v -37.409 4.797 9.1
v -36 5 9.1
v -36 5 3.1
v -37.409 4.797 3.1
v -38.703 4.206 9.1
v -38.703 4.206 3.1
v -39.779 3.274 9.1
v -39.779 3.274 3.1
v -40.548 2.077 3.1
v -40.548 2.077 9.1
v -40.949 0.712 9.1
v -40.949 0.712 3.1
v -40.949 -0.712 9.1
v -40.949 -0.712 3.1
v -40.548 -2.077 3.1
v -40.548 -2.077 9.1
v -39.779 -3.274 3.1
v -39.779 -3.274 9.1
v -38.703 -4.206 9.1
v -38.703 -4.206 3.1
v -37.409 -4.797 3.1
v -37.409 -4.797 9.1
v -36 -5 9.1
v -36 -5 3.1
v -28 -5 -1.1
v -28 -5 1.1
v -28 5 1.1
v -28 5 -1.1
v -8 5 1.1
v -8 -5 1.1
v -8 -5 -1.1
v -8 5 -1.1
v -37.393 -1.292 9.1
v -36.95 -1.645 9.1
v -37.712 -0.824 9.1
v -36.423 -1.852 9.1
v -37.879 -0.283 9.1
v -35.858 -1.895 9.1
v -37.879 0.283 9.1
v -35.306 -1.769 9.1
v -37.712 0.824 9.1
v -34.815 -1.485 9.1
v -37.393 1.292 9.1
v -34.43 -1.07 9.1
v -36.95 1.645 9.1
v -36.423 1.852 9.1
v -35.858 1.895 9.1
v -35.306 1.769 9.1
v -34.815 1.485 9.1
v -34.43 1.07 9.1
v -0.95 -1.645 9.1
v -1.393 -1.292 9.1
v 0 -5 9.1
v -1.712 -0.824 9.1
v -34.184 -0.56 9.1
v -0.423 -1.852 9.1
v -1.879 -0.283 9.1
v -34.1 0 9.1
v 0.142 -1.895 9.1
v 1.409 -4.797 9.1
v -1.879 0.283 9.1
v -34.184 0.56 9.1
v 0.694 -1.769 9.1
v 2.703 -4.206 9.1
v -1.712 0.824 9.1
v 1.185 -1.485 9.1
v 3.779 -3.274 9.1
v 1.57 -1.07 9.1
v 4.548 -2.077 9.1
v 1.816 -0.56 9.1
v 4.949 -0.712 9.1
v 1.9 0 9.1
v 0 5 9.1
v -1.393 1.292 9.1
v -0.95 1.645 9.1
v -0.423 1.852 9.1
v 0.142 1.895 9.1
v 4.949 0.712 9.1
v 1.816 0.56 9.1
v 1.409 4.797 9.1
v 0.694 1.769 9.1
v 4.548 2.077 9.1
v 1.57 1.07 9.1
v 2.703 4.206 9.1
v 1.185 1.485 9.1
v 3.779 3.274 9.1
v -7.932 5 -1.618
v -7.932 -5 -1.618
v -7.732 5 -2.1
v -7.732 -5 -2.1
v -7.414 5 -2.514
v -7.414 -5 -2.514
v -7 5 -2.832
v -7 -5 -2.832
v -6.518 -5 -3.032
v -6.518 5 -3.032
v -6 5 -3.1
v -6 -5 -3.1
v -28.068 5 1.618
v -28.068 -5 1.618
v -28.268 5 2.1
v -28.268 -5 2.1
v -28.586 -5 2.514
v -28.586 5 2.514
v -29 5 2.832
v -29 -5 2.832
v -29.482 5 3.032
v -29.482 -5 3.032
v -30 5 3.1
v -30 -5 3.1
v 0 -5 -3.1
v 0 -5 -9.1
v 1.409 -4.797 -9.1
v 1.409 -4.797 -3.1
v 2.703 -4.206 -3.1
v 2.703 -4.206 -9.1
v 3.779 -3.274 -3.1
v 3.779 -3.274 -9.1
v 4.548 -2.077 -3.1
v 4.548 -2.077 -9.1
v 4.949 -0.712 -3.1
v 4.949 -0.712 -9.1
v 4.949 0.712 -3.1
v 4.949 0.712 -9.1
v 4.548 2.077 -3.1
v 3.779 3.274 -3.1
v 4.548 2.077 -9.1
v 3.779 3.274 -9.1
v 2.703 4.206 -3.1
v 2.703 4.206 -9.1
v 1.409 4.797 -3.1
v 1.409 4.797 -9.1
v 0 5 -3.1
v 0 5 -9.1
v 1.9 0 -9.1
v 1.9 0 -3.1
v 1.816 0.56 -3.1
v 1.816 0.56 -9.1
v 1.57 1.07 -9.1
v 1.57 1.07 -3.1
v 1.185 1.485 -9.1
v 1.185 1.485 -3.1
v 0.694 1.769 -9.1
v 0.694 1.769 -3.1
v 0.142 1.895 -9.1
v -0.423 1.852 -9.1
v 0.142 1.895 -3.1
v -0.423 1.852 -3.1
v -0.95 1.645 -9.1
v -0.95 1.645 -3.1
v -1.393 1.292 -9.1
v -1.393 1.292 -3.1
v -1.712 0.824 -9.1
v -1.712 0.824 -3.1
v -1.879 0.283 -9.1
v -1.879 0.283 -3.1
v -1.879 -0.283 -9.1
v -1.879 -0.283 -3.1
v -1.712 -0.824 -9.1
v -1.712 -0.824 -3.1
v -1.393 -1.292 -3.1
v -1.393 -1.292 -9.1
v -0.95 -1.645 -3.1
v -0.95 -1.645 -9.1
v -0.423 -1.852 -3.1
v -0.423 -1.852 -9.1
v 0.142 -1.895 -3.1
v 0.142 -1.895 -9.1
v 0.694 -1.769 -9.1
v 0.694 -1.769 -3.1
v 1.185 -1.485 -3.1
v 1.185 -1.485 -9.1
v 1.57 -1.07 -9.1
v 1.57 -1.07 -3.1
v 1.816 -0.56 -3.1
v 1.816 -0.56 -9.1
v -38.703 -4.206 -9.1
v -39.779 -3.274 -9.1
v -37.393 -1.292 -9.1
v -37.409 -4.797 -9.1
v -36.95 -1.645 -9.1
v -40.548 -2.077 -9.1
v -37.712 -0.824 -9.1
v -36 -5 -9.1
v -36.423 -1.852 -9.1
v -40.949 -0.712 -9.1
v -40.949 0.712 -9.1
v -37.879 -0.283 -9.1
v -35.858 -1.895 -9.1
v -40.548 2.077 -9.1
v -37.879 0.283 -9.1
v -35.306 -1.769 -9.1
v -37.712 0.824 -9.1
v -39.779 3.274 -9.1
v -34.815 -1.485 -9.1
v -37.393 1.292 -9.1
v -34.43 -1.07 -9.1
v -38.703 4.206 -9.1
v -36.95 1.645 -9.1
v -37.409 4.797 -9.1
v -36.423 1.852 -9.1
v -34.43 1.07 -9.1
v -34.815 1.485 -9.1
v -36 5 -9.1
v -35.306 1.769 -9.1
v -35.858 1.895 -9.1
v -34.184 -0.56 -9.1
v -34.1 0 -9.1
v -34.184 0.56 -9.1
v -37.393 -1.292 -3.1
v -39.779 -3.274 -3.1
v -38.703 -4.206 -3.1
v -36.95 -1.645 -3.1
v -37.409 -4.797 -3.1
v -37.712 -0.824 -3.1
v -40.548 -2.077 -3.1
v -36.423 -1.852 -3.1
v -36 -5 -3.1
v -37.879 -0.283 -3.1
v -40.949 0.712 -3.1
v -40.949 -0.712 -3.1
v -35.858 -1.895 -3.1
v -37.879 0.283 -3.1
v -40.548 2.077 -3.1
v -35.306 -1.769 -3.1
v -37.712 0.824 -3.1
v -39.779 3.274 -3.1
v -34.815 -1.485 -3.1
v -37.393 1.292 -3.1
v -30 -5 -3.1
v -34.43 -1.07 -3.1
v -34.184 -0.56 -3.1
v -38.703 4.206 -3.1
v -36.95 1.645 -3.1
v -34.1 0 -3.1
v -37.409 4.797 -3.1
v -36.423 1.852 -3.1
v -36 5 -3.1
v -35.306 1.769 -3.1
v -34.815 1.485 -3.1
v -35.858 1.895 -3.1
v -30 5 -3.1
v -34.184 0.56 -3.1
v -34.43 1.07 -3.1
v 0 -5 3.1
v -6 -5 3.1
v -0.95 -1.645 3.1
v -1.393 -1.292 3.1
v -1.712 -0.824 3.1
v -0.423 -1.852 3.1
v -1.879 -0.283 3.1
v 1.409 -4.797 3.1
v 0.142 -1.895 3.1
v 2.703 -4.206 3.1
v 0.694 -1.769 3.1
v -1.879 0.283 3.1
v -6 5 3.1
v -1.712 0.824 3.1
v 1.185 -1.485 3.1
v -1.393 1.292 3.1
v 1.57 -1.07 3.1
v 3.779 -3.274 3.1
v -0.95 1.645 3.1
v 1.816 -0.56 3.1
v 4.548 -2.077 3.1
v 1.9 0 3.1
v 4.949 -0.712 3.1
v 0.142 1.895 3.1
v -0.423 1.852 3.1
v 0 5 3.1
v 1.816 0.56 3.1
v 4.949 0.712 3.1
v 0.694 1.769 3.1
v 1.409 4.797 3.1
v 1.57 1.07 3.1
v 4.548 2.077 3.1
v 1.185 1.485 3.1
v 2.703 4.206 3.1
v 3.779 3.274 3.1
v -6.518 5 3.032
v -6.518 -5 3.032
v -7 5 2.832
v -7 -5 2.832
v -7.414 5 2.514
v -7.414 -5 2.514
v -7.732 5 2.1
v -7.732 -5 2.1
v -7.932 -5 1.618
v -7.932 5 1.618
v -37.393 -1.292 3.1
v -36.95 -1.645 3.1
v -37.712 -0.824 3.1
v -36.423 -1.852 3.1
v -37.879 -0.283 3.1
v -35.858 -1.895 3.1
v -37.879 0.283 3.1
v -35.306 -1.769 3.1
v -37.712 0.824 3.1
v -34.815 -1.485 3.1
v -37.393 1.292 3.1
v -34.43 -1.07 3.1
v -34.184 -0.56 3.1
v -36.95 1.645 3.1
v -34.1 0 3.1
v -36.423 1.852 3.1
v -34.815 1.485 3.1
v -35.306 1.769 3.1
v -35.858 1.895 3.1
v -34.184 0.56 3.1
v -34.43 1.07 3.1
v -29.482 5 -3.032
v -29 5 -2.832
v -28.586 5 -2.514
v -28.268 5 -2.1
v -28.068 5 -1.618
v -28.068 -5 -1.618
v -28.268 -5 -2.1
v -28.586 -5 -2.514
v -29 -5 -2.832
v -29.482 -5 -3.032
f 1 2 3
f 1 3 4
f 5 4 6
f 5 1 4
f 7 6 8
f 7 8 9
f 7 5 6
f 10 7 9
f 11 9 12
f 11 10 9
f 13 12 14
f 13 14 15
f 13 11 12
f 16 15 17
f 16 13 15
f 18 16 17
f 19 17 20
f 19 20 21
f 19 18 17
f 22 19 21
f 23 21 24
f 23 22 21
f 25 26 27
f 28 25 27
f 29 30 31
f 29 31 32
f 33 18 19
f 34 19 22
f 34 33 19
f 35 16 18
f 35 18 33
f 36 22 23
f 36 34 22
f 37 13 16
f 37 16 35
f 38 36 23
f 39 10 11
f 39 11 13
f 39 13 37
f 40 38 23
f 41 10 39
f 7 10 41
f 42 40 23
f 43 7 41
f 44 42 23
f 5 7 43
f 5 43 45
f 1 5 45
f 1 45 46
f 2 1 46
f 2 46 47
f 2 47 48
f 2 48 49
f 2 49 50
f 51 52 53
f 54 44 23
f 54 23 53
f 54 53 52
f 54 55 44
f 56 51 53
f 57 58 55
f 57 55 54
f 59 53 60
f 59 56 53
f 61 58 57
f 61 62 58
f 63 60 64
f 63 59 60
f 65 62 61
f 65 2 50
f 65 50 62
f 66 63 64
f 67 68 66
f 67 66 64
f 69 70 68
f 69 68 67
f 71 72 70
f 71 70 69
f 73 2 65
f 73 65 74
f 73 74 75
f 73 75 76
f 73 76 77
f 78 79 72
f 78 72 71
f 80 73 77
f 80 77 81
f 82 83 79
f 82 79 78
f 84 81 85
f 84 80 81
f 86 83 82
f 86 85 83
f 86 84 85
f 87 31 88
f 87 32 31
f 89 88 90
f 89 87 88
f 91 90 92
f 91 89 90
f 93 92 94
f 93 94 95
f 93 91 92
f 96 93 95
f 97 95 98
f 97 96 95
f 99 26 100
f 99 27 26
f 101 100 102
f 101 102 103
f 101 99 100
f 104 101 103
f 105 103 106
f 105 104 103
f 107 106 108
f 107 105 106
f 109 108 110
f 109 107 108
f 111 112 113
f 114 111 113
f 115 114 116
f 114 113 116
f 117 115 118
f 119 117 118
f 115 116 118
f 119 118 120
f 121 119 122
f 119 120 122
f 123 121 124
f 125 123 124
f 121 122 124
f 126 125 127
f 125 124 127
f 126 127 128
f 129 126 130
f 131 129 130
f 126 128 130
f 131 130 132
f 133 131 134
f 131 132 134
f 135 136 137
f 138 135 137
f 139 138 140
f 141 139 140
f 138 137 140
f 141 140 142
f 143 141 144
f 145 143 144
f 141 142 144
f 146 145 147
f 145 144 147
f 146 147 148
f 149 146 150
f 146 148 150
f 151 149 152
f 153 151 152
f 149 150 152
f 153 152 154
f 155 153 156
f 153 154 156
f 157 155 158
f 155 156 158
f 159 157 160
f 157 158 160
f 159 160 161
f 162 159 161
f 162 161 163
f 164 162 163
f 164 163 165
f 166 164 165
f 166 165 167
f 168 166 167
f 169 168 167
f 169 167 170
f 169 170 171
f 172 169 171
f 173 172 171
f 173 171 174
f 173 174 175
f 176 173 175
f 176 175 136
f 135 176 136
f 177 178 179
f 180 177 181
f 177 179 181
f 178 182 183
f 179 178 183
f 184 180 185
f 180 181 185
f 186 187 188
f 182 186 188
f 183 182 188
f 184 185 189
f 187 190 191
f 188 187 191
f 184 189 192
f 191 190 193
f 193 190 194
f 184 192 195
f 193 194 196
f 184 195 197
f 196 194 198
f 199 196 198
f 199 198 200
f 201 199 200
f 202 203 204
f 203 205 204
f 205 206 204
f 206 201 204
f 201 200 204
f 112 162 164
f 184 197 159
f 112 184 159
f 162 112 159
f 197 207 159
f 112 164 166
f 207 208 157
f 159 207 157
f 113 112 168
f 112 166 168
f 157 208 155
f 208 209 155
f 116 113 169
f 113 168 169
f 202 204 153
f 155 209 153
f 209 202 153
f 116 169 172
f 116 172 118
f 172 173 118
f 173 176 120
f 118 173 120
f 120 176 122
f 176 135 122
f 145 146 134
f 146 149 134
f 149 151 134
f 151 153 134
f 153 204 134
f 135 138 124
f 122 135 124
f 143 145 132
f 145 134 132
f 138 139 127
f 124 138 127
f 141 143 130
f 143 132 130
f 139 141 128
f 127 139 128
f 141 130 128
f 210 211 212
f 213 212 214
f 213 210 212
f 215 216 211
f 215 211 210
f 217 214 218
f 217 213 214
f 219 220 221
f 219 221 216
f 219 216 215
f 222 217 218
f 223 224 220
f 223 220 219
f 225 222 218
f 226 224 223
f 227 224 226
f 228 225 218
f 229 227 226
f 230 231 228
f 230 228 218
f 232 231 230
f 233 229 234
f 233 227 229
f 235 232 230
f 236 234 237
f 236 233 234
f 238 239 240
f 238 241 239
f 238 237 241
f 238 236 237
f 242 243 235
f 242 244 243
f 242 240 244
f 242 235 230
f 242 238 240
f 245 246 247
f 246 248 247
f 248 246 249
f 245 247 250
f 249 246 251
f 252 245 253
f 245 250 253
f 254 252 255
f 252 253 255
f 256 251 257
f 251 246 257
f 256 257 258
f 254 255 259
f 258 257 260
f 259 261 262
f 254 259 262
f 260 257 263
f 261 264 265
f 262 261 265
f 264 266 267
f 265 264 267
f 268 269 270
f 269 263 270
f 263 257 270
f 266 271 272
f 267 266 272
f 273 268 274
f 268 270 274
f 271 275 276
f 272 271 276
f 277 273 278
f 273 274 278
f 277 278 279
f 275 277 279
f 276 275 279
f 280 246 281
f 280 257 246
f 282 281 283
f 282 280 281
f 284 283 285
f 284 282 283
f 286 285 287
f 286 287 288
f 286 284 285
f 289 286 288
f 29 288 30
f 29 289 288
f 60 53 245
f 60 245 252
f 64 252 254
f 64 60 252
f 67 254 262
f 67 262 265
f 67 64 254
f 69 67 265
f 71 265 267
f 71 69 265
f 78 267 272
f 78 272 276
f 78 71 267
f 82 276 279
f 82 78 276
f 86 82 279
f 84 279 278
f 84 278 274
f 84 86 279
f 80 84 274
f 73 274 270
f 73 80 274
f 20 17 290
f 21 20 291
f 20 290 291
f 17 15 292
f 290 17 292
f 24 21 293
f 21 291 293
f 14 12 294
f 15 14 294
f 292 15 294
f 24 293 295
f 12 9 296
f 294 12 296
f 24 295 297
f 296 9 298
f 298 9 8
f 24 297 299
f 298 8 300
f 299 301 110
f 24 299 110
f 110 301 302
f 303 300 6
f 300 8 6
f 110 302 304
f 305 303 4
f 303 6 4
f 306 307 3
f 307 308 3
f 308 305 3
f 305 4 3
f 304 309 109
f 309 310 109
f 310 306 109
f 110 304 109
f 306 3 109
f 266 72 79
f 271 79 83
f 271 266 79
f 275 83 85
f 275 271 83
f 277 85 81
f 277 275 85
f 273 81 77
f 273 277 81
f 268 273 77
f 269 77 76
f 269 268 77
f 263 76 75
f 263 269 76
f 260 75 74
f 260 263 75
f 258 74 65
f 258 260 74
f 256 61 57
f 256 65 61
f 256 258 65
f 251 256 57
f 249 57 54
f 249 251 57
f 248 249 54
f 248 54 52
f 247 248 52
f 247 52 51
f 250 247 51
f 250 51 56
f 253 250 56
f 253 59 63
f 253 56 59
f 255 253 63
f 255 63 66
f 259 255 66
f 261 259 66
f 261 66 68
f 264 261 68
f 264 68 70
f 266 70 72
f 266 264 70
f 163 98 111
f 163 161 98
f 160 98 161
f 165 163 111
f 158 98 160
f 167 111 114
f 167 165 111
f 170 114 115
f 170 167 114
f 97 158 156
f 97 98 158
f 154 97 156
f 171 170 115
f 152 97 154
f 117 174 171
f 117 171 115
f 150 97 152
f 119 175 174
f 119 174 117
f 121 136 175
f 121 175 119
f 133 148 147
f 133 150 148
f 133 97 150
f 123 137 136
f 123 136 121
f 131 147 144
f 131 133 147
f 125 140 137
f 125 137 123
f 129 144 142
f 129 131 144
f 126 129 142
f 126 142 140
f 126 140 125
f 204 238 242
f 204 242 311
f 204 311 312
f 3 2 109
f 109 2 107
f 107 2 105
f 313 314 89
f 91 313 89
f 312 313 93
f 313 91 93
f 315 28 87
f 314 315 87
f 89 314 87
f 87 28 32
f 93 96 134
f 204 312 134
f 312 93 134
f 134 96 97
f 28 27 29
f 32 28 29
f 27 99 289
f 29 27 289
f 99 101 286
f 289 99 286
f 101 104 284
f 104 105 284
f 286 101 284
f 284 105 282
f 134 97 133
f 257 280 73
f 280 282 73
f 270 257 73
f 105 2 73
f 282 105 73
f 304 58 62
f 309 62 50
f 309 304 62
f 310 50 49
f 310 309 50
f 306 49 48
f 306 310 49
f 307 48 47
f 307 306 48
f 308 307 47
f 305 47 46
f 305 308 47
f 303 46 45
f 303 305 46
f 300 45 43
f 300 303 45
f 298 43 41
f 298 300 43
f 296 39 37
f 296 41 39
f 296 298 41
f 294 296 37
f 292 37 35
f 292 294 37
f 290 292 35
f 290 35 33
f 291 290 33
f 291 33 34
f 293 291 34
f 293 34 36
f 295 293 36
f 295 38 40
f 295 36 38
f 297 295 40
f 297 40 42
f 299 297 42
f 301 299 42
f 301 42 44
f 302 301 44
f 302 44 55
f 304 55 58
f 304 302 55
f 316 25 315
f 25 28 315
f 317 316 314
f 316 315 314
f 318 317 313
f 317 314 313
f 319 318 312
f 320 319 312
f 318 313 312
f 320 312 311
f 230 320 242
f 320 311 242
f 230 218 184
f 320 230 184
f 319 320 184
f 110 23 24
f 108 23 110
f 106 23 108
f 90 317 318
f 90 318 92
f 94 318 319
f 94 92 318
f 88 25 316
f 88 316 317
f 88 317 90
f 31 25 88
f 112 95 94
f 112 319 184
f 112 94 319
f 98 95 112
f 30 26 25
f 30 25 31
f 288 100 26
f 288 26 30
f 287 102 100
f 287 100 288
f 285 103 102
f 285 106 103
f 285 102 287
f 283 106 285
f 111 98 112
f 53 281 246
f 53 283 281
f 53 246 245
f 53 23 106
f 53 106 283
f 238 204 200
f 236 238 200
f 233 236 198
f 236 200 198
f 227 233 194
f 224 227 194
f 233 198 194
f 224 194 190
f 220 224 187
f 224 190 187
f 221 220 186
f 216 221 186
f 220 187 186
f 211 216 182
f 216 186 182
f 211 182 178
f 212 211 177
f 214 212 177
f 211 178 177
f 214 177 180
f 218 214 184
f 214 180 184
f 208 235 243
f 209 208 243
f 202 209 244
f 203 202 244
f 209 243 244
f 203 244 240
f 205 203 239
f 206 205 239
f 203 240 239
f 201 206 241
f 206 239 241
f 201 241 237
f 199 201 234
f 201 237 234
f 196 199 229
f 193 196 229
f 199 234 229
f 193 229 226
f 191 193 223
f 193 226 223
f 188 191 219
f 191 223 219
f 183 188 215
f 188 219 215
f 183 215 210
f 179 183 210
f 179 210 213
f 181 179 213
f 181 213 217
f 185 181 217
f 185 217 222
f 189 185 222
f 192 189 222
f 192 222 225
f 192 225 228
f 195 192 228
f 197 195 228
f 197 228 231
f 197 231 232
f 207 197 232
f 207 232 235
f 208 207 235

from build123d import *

# Parameters (mm, degrees)
EXTRUDE_START       = -9.1
EXTRUDE_1_DEPTH     = 6
SKETCH_5_R          = 1.9
CUT_EXTRUDE_5_DEPTH = 42.737273509
SKETCH_6_R          = 1.9
CUT_EXTRUDE_6_DEPTH = 10
SKETCH_7_W          = 20
SKETCH_7_H          = 10
EXTRUDE_2_DEPTH     = 3.1
FILLET_1_R          = 2


with BuildPart() as part:
    # ｽｹｯﾁ1 → ﾎﾞｽ - 押し出し1 (new body)
    with BuildSketch(Plane.XY.offset(EXTRUDE_START)):
        with BuildLine():
            Line((0, 5), (-36, 5))
            ThreePointArc((-36, 5), (-41, 0), (-36, -5))
            Line((-36, -5), (0, -5))
            ThreePointArc((0, -5), (5, 0), (0, 5))
        make_face()
    extrude_1 = extrude(amount=EXTRUDE_1_DEPTH)

    # ｽｹｯﾁ5 → ｶｯﾄ - 押し出し5 (cut, through all)
    with BuildSketch(Plane.XY.offset(-3.1)):
        with Locations((-36, 0)):
            Circle(SKETCH_5_R)
    cut_extrude_5 = extrude(amount=-CUT_EXTRUDE_5_DEPTH, mode=Mode.SUBTRACT)

    # ｽｹｯﾁ6 → ｶｯﾄ - 押し出し6 (cut)
    with BuildSketch(Plane.XY.offset(-3.1)):
        Circle(SKETCH_6_R)
    cut_extrude_6 = extrude(amount=-CUT_EXTRUDE_6_DEPTH, mode=Mode.SUBTRACT)

    # ｽｹｯﾁ7 → ﾎﾞｽ - 押し出し2 (add)
    with BuildSketch(Plane.XY.offset(-3.1)):
        with Locations((-18, 0)):
            Rectangle(SKETCH_7_W, SKETCH_7_H)
    extrude_2 = extrude(amount=EXTRUDE_2_DEPTH)

    # ﾐﾗｰ3: ﾎﾞｽ - 押し出し1, ｶｯﾄ - 押し出し5, ｶｯﾄ - 押し出し6, ﾎﾞｽ - 押し出し2 across plane
    add(extrude_1.mirror(Plane.XY))
    add(cut_extrude_5.mirror(Plane.XY), mode=Mode.SUBTRACT)
    add(cut_extrude_6.mirror(Plane.XY), mode=Mode.SUBTRACT)
    add(extrude_2.mirror(Plane.XY))

    # ﾌｨﾚｯﾄ1
    fillet_1_edges = [part.edges().sort_by_distance(p)[0] for p in [
        (-8, 0, -3.1),
        (-28, 0, -3.1),
        (-8, 0, 3.1),
        (-28, 0, 3.1),
    ]]
    fillet(fillet_1_edges, radius=FILLET_1_R)


solid = part.part
